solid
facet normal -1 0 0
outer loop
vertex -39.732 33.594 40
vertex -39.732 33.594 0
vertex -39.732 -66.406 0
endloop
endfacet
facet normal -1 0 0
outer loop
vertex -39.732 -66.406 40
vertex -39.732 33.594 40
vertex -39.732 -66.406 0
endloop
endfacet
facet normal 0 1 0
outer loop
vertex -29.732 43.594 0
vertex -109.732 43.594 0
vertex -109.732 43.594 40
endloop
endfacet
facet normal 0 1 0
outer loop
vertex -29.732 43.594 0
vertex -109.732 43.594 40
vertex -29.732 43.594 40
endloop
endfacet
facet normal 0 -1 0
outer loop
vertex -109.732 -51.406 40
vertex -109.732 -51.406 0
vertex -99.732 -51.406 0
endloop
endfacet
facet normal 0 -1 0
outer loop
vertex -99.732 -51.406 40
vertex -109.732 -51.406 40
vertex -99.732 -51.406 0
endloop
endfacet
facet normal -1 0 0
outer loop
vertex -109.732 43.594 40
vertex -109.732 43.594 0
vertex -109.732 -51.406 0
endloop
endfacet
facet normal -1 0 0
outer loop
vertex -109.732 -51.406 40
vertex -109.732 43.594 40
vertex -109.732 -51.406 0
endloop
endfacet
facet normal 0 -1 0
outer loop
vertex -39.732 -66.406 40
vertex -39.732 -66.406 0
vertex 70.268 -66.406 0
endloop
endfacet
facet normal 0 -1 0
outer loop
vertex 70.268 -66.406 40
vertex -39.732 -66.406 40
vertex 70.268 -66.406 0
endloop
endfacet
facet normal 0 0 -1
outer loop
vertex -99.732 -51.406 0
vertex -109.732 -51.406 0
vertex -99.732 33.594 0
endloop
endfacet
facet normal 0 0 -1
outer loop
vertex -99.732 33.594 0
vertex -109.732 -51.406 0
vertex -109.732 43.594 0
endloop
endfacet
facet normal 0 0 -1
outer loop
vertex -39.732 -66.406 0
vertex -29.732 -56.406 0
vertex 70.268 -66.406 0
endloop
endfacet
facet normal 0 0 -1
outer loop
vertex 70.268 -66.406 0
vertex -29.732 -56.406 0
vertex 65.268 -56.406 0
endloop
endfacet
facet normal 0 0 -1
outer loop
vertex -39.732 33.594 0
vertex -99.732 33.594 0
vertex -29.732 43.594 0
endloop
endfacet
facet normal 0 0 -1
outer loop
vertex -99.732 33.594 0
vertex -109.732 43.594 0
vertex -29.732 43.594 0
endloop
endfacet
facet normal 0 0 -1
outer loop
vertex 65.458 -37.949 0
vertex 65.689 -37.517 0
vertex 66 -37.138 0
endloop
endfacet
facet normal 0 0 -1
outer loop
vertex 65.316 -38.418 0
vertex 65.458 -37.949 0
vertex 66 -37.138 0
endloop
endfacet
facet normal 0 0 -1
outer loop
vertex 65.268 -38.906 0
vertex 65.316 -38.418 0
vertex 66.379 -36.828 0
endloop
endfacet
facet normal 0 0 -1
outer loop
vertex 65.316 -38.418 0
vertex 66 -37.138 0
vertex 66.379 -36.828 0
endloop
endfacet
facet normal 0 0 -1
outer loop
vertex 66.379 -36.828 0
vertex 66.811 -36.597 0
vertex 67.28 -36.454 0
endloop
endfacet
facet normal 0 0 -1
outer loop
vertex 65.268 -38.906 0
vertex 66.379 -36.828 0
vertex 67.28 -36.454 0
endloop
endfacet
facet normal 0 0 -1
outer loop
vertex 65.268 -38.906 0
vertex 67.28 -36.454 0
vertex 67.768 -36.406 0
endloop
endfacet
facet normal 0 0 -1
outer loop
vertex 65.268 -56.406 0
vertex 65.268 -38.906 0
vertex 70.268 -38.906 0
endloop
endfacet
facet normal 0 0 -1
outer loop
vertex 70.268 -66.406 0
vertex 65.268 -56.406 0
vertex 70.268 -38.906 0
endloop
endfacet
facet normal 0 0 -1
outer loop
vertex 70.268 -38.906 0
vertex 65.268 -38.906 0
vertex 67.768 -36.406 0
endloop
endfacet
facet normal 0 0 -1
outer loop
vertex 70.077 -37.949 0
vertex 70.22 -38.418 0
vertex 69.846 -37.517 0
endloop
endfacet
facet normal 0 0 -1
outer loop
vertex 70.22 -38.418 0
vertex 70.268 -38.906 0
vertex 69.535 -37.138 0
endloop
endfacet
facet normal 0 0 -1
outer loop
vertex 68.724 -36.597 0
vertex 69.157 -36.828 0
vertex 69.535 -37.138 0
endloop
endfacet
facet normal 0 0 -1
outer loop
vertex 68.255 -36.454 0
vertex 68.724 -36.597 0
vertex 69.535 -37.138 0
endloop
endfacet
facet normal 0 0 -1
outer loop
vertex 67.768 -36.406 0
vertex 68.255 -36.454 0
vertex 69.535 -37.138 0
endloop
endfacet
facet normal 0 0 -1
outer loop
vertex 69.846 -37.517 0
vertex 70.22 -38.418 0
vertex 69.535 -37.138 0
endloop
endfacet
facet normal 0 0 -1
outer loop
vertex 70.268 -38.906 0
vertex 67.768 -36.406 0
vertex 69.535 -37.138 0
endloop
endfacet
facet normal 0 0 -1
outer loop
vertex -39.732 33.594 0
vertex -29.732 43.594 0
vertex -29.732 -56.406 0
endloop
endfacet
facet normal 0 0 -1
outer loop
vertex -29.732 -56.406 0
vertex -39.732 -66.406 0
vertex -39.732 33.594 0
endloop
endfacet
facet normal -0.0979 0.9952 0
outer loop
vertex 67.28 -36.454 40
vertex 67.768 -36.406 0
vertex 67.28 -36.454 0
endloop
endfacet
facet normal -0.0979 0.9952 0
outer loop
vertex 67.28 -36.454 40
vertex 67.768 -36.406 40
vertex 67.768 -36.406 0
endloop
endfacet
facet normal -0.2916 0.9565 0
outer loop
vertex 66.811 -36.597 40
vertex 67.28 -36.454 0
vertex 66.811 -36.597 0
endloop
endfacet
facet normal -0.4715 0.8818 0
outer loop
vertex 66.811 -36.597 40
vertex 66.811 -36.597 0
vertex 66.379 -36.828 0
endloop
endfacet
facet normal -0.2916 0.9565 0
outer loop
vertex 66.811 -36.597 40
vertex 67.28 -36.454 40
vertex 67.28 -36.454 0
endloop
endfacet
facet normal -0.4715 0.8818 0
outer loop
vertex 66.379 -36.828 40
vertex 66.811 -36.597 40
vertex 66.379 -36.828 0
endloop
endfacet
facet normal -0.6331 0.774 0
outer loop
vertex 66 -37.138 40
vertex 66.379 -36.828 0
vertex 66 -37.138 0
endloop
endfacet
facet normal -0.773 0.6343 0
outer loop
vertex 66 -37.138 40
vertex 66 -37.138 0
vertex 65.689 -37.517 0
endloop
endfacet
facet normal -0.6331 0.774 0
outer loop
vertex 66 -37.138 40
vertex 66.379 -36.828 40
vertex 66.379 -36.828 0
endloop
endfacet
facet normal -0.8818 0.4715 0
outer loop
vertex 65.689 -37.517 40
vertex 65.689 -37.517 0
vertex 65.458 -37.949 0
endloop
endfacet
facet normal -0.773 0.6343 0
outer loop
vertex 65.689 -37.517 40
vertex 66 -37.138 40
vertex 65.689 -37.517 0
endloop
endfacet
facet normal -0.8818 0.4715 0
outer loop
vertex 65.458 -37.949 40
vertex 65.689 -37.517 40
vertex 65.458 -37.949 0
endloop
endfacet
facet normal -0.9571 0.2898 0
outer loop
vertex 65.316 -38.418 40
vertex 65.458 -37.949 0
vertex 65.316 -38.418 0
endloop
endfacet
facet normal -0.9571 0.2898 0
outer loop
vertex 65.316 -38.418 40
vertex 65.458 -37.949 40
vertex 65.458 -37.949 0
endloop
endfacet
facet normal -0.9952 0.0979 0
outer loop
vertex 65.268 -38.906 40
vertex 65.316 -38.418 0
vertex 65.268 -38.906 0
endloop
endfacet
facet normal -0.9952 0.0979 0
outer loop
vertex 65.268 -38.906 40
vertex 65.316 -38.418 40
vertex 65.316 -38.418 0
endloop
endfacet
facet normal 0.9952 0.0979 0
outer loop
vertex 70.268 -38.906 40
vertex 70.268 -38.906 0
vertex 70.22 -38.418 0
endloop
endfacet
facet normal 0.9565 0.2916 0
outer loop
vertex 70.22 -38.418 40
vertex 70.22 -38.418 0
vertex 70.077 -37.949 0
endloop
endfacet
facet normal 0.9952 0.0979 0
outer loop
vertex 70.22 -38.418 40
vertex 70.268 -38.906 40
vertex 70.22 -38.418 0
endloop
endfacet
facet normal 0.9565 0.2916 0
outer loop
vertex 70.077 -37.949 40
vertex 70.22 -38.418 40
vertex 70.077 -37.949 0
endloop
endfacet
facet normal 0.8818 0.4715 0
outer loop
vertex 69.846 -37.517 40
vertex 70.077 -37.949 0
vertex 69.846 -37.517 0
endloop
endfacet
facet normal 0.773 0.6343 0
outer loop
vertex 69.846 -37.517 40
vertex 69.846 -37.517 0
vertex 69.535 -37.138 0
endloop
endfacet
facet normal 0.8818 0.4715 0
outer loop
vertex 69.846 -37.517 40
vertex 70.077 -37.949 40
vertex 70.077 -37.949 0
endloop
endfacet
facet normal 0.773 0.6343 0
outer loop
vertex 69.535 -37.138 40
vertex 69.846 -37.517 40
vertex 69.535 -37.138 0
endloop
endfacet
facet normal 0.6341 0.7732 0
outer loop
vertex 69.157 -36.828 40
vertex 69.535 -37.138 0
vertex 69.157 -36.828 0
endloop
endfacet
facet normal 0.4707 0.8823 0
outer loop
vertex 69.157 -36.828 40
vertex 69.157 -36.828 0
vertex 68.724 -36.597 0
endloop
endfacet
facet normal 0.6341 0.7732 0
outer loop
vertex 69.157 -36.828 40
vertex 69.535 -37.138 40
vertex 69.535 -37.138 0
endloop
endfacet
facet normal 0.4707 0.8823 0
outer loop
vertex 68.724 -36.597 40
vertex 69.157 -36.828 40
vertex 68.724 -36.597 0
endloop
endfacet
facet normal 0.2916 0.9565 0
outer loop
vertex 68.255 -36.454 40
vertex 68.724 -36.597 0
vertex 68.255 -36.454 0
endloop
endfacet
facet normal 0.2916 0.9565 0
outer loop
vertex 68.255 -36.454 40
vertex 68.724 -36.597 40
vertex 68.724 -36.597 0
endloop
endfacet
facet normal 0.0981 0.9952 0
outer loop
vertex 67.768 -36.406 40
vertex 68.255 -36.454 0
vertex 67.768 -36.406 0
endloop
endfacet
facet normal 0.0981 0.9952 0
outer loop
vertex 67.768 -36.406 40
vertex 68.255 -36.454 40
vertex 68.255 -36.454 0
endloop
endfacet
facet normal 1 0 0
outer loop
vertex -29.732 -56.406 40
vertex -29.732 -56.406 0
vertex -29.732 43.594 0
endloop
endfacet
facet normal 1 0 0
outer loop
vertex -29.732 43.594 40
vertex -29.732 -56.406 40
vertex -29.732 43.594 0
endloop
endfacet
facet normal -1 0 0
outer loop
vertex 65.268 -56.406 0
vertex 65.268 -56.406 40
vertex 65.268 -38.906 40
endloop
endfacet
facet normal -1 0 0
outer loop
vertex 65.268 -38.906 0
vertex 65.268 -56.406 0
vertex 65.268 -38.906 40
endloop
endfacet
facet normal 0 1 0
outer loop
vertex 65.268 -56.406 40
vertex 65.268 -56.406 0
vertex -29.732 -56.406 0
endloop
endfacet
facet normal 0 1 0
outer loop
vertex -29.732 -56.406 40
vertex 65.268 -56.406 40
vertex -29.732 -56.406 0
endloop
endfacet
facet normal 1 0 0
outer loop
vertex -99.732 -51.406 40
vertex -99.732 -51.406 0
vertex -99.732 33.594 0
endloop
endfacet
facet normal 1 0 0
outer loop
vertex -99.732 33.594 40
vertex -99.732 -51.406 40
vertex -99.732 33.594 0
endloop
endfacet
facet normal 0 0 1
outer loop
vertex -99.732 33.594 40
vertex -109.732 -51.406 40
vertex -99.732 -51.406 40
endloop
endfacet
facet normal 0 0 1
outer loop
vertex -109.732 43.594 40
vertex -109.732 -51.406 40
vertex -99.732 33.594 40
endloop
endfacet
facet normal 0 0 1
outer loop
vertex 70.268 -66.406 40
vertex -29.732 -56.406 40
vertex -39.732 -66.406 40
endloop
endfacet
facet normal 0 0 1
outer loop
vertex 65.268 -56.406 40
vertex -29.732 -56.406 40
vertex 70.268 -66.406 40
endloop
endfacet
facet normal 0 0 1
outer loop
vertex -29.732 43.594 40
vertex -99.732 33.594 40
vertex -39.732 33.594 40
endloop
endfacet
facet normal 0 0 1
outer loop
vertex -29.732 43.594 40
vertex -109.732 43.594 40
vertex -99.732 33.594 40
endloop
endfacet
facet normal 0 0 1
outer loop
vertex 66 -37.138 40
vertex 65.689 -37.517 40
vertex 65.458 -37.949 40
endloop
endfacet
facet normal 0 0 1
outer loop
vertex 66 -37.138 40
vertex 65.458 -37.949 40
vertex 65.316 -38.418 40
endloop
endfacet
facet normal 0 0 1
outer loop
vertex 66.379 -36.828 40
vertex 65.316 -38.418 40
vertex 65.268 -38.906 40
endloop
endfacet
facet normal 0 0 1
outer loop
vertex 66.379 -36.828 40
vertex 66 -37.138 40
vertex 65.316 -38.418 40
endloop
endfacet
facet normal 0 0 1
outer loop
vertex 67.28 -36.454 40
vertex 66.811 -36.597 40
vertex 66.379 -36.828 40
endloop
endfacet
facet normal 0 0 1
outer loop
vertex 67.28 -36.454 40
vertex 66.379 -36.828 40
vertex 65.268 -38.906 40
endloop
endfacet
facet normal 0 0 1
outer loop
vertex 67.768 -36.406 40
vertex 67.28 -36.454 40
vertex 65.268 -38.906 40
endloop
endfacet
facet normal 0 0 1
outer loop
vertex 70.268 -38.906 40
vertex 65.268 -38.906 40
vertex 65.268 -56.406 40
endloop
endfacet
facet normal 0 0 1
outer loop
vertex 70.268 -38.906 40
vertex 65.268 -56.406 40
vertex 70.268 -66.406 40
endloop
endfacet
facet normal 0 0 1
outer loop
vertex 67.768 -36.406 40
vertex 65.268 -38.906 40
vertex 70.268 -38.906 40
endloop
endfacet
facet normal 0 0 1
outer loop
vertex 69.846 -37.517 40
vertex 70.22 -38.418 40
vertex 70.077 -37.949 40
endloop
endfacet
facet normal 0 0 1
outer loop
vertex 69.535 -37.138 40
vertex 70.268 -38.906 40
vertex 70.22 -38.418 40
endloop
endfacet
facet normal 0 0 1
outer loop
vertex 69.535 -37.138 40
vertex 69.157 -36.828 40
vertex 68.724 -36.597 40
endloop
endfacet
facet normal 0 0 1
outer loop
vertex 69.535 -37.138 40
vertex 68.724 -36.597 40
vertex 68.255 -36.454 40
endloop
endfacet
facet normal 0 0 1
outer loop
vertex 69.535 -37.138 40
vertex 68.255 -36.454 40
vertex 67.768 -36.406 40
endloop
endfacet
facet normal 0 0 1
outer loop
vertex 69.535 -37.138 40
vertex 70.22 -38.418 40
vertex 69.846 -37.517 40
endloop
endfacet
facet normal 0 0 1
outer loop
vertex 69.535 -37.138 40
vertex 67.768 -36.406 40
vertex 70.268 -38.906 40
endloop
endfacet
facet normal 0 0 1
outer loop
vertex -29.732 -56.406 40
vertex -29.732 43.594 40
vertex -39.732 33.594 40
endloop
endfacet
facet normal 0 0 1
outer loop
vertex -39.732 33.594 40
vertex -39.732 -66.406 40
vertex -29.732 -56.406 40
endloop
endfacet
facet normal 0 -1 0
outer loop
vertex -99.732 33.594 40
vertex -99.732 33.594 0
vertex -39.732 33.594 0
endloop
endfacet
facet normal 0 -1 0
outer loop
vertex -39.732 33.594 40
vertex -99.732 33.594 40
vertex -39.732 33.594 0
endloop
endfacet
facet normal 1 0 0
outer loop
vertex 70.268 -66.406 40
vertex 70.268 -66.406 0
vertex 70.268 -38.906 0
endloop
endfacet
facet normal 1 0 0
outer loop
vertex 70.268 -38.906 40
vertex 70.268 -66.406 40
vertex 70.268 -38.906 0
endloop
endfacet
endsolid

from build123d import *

# Parameters (mm, degrees)
SKETCH_1_W      = 10
SKETCH_1_H      = 90
SKETCH_1_W_2    = 80
SKETCH_1_H_2    = 10
SKETCH_1_W_3    = 5
SKETCH_1_H_3    = 20
SKETCH_1_H_4    = 85
EXTRUDE_1_DEPTH = 40
FILLET_1_R      = 2.5


with BuildPart() as part:
    # 草圖1 → 填料-伸長1 (new body)
    with BuildSketch(Plane.XY):
        with Locations((-34.732391425, -11.40625)):
            Rectangle(SKETCH_1_W, SKETCH_1_H)
        Polygon((-29.732391425, -56.40625), (-39.732391425, -56.40625), (-39.732391425, -66.40625), (70.267608575, -66.40625), (70.267608575, -56.40625), (65.267608575, -56.40625), align=None)
        with Locations((-69.732391425, 38.59375)):
            Rectangle(SKETCH_1_W_2, SKETCH_1_H_2)
        with Locations((67.767608575, -46.40625)):
            Rectangle(SKETCH_1_W_3, SKETCH_1_H_3)
        with Locations((-104.732391425, -8.90625)):
            Rectangle(SKETCH_1_W, SKETCH_1_H_4)
    extrude(amount=EXTRUDE_1_DEPTH)

    # 圓角1
    fillet_1_edges = [part.edges().sort_by_distance(p)[0] for p in [
        (70.267608575, -36.40625, 20),
        (65.267608575, -36.40625, 20),
    ]]
    fillet(fillet_1_edges, radius=FILLET_1_R - 0.0001)  # a hair under: the kernel refuses the full size


solid = part.part
